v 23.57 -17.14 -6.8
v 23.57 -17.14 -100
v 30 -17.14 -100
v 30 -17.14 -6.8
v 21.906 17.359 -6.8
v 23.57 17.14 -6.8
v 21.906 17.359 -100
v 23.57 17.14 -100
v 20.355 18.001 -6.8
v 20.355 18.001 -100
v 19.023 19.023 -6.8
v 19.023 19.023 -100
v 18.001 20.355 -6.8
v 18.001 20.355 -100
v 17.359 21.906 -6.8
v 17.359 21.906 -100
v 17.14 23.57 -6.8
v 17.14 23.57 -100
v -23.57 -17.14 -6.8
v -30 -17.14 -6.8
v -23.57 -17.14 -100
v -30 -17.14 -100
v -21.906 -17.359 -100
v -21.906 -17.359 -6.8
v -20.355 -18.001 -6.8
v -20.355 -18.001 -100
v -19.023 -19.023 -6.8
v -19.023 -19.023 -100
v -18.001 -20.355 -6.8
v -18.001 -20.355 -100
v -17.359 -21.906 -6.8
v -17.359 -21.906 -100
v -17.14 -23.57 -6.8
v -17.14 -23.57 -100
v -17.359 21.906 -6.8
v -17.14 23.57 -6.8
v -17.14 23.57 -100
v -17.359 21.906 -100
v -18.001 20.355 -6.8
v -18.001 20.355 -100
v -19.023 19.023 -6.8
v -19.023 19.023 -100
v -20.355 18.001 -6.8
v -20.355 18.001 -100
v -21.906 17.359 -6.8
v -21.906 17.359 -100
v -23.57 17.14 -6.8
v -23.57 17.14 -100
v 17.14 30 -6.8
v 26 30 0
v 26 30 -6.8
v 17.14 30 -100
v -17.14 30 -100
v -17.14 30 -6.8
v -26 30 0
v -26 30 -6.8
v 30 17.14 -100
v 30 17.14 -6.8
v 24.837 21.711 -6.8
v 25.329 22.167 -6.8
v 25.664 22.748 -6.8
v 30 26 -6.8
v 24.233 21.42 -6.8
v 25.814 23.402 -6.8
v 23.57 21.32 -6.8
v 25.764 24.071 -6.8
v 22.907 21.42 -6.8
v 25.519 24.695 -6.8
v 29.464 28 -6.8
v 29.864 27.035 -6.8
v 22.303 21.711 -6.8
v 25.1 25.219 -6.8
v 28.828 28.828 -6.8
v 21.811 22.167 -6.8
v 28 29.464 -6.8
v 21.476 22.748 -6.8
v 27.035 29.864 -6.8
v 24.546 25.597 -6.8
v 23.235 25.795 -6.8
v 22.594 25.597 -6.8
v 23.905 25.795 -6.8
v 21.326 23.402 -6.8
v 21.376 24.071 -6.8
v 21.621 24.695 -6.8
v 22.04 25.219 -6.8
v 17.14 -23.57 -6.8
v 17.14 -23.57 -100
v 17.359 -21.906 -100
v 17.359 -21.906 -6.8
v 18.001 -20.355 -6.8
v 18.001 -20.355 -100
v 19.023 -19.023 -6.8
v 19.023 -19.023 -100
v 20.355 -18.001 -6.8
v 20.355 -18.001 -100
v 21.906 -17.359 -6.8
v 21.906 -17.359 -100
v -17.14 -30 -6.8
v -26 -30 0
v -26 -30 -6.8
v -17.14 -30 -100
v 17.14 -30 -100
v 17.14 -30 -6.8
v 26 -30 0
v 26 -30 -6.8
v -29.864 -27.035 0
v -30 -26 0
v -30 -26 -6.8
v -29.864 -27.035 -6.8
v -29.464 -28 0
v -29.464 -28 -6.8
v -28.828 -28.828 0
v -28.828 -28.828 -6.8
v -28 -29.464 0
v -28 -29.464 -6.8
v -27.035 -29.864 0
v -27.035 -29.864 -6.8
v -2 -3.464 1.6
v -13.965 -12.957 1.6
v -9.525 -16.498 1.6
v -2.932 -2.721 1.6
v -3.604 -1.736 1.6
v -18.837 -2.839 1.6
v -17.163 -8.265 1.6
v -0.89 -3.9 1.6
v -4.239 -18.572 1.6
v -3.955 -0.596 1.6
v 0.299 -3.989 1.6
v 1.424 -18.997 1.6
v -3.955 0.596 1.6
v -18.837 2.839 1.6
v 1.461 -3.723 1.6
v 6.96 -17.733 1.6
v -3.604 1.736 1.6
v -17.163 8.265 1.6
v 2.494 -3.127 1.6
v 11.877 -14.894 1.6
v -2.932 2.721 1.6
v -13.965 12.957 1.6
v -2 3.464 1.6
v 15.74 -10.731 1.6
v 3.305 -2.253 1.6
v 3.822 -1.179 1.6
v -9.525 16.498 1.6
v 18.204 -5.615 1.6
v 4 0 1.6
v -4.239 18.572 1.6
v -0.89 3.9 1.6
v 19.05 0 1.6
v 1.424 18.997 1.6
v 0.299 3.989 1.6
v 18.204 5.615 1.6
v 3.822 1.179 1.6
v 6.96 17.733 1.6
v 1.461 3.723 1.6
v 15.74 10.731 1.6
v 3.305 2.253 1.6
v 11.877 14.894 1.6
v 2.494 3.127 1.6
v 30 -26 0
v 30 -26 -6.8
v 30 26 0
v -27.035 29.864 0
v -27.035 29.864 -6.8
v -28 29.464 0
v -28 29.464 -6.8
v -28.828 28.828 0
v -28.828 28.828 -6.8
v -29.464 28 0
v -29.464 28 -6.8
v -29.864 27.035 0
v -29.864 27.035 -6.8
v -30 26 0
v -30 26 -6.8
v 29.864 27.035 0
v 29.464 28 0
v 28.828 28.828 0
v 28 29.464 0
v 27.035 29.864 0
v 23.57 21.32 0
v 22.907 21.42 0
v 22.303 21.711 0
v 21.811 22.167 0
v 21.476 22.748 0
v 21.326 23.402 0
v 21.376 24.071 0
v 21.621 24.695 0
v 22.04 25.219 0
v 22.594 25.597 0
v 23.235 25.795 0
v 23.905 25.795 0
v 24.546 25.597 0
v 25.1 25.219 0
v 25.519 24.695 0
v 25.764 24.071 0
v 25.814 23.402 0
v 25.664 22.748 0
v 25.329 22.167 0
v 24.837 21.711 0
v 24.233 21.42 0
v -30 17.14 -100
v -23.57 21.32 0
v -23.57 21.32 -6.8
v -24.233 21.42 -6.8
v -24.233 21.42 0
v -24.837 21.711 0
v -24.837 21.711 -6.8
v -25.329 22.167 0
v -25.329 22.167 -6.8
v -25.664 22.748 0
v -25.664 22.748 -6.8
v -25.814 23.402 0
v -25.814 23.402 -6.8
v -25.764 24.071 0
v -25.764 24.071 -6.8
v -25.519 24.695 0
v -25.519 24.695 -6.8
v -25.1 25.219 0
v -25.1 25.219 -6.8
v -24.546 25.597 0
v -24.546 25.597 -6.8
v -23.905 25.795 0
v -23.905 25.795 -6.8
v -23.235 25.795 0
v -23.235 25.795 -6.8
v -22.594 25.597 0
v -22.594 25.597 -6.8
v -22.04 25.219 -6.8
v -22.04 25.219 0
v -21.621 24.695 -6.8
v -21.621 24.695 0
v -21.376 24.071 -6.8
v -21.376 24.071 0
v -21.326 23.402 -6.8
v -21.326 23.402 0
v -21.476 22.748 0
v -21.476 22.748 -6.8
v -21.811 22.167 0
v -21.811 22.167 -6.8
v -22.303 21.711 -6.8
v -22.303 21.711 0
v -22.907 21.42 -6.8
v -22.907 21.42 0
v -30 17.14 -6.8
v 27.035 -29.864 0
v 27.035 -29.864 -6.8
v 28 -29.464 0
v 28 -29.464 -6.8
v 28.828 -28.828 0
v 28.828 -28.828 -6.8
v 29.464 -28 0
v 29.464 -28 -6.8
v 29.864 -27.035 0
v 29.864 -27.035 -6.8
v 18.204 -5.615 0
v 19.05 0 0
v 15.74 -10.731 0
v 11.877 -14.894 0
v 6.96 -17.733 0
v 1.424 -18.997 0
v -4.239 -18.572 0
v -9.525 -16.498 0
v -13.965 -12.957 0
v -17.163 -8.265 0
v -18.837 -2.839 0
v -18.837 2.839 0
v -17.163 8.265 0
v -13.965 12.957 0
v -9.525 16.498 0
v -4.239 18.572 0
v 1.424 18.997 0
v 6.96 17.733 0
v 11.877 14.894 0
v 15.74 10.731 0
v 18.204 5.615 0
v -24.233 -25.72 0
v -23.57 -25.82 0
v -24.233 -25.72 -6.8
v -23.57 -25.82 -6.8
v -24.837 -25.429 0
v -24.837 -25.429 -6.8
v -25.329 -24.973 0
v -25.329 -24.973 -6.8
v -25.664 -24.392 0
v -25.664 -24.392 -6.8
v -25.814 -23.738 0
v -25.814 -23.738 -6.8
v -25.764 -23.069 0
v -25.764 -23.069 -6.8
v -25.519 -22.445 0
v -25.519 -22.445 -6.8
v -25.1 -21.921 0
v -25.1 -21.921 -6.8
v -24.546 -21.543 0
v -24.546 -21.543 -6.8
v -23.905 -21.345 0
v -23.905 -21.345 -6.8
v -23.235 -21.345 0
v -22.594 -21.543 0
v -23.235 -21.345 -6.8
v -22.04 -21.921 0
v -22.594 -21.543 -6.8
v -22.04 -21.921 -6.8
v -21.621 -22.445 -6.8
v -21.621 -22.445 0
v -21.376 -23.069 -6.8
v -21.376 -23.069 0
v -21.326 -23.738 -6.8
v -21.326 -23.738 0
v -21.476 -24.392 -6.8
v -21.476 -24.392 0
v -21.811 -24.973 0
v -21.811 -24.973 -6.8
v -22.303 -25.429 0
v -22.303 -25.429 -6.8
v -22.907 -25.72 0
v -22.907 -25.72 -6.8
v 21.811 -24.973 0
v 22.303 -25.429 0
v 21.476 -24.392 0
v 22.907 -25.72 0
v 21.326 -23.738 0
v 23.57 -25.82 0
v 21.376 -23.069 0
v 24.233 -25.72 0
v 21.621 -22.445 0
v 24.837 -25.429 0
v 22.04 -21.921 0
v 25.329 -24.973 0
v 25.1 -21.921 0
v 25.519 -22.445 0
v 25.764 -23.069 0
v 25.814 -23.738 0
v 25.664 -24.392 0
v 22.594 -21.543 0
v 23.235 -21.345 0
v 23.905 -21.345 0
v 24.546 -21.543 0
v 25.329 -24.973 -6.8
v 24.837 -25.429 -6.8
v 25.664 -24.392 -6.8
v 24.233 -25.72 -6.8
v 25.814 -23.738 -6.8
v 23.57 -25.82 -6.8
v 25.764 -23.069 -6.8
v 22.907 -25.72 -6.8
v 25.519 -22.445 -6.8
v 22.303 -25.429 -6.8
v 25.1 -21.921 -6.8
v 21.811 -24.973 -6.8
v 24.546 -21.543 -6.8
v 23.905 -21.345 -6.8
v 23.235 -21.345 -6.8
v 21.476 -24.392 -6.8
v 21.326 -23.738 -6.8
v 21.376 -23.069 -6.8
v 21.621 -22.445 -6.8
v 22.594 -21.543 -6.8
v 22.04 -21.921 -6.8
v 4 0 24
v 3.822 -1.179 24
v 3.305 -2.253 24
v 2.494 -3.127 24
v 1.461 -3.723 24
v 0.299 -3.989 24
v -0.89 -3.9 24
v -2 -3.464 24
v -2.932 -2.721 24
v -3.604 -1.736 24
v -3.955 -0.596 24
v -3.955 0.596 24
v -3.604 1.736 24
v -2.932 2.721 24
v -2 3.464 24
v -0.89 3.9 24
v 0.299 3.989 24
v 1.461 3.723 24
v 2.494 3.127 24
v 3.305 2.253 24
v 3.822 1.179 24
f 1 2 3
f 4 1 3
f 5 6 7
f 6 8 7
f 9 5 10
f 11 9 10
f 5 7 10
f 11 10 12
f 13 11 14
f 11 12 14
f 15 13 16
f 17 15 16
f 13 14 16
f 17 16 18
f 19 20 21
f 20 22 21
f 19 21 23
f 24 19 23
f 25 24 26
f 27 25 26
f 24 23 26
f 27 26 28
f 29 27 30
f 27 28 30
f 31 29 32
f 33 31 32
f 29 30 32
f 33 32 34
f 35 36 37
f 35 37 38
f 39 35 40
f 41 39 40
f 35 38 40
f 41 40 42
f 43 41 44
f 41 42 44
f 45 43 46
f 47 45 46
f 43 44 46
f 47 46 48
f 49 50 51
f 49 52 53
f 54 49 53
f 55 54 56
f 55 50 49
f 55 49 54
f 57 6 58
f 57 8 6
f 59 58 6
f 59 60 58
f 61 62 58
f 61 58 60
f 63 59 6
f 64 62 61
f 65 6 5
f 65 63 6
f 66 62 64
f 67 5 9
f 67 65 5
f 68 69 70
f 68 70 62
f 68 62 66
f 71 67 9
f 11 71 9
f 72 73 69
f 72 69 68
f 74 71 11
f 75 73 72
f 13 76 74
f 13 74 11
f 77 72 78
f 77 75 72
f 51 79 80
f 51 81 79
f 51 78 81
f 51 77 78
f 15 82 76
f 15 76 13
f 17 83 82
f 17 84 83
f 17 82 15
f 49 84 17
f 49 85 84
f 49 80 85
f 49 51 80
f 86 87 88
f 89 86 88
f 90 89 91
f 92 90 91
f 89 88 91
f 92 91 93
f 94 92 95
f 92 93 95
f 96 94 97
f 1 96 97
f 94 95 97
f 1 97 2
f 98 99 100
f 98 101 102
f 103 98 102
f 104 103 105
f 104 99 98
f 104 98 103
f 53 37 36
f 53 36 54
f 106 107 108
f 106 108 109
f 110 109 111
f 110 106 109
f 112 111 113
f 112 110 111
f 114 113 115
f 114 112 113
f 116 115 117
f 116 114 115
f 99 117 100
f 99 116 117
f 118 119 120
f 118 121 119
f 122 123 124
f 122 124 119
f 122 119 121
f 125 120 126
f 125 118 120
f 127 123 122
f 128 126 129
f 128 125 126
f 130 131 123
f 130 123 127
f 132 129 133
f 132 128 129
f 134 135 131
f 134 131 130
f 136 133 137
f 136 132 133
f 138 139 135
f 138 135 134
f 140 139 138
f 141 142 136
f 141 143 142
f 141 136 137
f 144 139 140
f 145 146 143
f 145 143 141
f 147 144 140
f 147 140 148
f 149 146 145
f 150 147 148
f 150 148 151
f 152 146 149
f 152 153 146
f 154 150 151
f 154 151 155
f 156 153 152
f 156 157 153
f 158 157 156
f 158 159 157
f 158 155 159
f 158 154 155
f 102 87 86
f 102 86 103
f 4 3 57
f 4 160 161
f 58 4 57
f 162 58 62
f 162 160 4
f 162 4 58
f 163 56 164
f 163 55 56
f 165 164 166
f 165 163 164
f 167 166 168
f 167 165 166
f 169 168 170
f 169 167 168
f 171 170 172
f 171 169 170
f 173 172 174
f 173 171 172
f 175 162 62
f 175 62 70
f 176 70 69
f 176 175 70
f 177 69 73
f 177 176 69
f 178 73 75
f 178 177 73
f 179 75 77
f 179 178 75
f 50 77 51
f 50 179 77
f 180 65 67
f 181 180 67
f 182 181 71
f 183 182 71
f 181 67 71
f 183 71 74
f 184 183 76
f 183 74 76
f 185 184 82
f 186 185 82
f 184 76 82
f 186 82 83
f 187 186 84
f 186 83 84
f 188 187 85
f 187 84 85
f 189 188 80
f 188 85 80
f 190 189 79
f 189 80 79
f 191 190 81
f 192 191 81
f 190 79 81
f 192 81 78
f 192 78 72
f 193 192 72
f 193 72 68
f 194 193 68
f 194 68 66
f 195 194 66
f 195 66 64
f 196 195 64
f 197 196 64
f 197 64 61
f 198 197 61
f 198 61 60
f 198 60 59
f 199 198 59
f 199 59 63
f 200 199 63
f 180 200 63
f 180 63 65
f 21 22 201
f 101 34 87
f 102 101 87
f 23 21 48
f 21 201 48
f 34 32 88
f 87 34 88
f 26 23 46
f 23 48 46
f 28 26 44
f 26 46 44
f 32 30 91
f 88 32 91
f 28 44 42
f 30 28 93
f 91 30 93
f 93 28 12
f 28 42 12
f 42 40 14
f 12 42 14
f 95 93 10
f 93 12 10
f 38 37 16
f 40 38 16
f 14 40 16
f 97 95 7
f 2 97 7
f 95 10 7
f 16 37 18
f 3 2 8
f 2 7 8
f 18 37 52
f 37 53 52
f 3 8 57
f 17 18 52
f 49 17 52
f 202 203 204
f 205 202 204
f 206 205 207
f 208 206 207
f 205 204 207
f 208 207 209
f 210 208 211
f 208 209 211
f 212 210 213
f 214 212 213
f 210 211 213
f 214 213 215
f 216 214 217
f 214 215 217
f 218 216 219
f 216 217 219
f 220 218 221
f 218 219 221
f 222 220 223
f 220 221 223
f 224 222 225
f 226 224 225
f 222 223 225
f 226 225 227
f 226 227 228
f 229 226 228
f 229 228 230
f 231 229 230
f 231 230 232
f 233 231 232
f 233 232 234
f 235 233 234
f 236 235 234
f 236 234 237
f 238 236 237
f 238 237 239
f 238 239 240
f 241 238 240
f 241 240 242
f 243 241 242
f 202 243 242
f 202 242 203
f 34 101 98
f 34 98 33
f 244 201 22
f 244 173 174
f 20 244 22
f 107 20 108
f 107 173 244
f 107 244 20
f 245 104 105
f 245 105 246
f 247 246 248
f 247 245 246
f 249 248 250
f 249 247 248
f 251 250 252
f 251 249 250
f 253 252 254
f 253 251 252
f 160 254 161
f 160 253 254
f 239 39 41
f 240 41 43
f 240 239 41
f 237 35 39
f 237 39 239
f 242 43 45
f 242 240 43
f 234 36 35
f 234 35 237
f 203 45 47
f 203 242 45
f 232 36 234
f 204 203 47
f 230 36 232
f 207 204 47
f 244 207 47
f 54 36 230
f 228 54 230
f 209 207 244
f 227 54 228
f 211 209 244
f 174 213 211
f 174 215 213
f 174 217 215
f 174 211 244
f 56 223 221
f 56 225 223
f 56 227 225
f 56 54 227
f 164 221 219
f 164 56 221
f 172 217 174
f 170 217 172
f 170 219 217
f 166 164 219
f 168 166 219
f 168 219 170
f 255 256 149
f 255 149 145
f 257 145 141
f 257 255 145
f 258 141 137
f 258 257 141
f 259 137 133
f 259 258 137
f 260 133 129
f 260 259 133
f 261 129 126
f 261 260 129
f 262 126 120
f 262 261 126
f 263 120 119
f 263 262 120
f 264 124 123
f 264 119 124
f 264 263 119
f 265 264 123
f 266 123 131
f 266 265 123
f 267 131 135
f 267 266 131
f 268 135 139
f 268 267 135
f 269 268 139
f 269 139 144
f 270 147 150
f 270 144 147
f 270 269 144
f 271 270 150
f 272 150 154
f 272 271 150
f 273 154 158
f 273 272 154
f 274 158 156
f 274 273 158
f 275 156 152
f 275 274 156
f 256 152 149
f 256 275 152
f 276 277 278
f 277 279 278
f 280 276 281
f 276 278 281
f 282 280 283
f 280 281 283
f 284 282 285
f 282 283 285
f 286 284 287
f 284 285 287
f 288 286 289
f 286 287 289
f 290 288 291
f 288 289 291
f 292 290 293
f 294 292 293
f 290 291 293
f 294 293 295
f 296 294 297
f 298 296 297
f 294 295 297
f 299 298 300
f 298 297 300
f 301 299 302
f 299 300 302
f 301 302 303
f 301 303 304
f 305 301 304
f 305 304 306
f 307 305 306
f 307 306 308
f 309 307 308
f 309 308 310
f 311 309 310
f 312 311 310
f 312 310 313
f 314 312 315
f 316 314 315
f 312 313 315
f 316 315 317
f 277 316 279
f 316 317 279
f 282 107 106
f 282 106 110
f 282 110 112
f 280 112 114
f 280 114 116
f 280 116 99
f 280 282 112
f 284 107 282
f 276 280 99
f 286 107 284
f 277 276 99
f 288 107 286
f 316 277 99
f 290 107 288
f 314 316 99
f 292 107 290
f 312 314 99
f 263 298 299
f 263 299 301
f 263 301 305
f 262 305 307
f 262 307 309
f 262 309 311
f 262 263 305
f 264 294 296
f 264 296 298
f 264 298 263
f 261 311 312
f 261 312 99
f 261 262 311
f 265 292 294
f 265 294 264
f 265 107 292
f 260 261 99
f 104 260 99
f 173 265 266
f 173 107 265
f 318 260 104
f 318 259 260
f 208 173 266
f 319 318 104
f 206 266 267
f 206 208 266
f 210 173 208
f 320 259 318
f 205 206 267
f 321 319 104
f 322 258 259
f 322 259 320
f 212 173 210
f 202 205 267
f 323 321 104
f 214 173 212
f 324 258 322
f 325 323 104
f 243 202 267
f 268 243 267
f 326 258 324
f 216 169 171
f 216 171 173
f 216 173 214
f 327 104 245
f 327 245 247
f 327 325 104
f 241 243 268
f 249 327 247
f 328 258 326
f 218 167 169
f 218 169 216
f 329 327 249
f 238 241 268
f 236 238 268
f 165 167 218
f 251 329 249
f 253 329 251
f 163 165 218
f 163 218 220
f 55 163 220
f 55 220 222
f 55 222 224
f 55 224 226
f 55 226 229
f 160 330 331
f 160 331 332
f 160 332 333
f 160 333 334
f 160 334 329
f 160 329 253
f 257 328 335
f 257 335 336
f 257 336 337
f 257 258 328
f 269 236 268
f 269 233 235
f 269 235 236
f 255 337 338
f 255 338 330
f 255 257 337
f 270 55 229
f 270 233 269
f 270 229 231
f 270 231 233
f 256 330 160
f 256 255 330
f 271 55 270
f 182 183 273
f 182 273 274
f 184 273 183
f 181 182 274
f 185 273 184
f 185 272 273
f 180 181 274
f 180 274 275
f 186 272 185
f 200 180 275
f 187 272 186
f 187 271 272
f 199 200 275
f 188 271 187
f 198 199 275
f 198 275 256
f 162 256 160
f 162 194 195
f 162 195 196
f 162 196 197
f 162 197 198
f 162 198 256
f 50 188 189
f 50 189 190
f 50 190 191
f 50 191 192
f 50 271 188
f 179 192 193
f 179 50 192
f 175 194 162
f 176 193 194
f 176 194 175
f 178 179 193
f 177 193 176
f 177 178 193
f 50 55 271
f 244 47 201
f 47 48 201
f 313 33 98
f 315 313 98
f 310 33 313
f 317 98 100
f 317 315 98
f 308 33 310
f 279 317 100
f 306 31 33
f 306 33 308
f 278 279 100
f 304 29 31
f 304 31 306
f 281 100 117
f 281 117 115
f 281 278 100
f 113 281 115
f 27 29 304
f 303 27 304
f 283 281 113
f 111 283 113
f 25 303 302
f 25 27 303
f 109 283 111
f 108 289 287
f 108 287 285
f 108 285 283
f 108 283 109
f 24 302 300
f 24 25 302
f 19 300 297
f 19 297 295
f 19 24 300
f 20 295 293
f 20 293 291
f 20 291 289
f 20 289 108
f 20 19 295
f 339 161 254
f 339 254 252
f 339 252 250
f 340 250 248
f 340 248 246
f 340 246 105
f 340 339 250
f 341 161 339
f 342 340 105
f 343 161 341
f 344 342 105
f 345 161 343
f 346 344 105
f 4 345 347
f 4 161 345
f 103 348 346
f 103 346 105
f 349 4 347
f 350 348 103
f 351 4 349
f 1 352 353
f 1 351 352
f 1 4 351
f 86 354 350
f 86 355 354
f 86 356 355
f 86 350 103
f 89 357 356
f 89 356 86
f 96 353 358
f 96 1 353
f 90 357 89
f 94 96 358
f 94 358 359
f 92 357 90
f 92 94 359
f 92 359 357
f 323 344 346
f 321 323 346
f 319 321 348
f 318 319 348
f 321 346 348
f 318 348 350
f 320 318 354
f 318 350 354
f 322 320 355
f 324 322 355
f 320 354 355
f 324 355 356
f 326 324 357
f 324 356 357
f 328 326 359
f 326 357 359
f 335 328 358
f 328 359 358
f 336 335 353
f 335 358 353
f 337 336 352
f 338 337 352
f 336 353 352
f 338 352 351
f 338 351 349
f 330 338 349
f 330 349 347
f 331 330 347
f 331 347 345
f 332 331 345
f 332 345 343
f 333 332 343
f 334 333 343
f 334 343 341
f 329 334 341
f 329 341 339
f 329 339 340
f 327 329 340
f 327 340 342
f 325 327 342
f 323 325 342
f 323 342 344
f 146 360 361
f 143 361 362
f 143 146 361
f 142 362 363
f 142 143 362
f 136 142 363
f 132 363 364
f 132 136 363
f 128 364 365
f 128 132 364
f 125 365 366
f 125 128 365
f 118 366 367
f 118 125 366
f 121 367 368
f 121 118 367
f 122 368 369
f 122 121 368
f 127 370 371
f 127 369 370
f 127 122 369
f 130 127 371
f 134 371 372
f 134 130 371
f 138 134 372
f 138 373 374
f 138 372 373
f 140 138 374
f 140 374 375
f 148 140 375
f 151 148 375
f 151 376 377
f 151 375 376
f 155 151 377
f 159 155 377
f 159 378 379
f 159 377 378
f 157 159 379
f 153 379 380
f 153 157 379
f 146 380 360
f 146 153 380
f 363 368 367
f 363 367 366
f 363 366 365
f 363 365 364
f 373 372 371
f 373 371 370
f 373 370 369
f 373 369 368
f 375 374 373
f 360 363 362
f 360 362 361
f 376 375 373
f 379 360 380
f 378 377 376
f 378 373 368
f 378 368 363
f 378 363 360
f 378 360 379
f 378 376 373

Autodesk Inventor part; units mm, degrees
ref_plane "YZ Plane" through (0, 0, 0) normal (1, 0, 0) x (0, 1, 0)
ref_plane "XZ Plane" through (0, 0, 0) normal (0, 1, 0) x (-1, 0, 0)
ref_plane "XY Plane" through (0, 0, 0) normal (0, 0, 1) x (1, 0, 0)
sketch "Skizze1" plane through (0, 0, 0) normal (0, 0, 1) x (1, 0, 0)
  line L0 (-26, -30) -> (26, -30)
  line L1 (30, -26) -> (30, 26)
  line L2 (26, 30) -> (-26, 30)
  line L3 (-30, 26) -> (-30, -26)
  line L4 (-30, -30) -> (30, 30) construction
  line L5 (30, -30) -> (-30, 30) construction
  arc A0 (30, 26) -> (26, 30) centre (26, 26) ccw
  arc A1 (26, -30) -> (30, -26) centre (26, -26) ccw
  arc A2 (-30, -26) -> (-26, -30) centre (-26, -26) ccw
  arc A3 (-26, 30) -> (-30, 26) centre (-26, 26) ccw
  point P0 (0, 0)
  dimension "d0" = 4
  dimension "d1" = 60
extrude "Extrusion1" add sketch "Skizze1" against normal blind 100
sketch "Skizze2" plane through (0, 0, 0) normal (0, 0, 1) x (1, 0, 0)
  circle A0 centre (0, 0) radius 19.05
  dimension "d4" = 38.1
extrude "Extrusion2" add sketch "Skizze2" along normal blind 1.6
sketch "Skizze4" plane through (0, 0, 0) normal (0, 0, 1) x (1, 0, 0)
  circle A0 centre (0, 0) radius 19.05 projected
  line L0 (30, 26) -> (30, -26) projected
  arc A1 (30, 26) -> (26, 30) centre (26, 26) ccw projected
  line L1 (-26, 30) -> (26, 30) projected
  arc A2 (-26, 30) -> (-30, 26) centre (-26, 26) ccw projected
  line L2 (-30, -26) -> (-30, 26) projected
  arc A3 (-30, -26) -> (-26, -30) centre (-26, -26) ccw projected
  line L3 (26, -30) -> (-26, -30) projected
  arc A4 (26, -30) -> (30, -26) centre (26, -26) ccw projected
  line L4 (26, -26) -> (-26, 26) construction
  line L5 (-23.57, 23.57) -> (23.57, 23.57) construction
  line L6 (23.57, 23.57) -> (23.57, -23.57) construction
  line L7 (23.57, -23.57) -> (-23.57, -23.57) construction
  line L8 (-23.57, -23.57) -> (-23.57, 23.57) construction
  line L9 (-23.57, 23.57) -> (23.57, -23.57) construction
  line L10 (23.57, 23.57) -> (-23.57, -23.57) construction
  dimension "d15" = 47.14
hole "Bohrung1" at (23.57, 23.57, 0) at (-23.57, 23.57, 0) at (-23.57, -23.57, 0) at (23.57, -23.57, 0) direction (0, 0, -1) diameter 4.5 end through all
sketch "Skizze5" plane through (0, 0, 1.6) normal (0, 0, 1) x (1, 0, 0)
  circle A0 centre (0, 0) radius 4
  dimension "d23" = 8
extrude "Extrusion4" add sketch "Skizze5" along normal blind 22.4
sketch "Skizze7" plane through (0, 0, -100) normal (0, 0, -1) x (-1, 0, 0)
  circle A0 centre (23.57, -23.57) radius 2.25 projected
  circle A1 centre (-23.57, 23.57) radius 2.25 projected
  circle A2 centre (23.57, 23.57) radius 2.25 projected
  circle A3 centre (-23.57, -23.57) radius 2.25 projected
  line L0 (-30, 26) -> (-30, -26) projected
  arc A4 (-30, -26) -> (-26, -30) centre (-26, -26) ccw projected
  line L1 (-26, -30) -> (26, -30) projected
  arc A5 (26, -30) -> (30, -26) centre (26, -26) ccw projected
  line L2 (30, -26) -> (30, 26) projected
  arc A6 (30, 26) -> (26, 30) centre (26, 26) ccw projected
  line L3 (26, 30) -> (-26, 30) projected
  arc A7 (-26, 30) -> (-30, 26) centre (-26, 26) ccw projected
  circle A8 centre (23.57, -23.57) radius 6.43 construction
  line L4 (30, -26) -> (30, 26) projected
  line L5 (30, -17.14) -> (23.57, -17.14)
  line L6 (-26, -30) -> (26, -30) projected
  line L7 (17.14, -30) -> (17.14, -23.57)
  arc A9 (23.57, -17.14) -> (17.14, -23.57) centre (23.57, -23.57) ccw
  arc A10 (-17.14, -23.57) -> (-23.57, -17.14) centre (-23.57, -23.57) ccw
  arc A11 (17.2019, 24.4599) -> (23.57, 17.14) centre (23.57, 23.57) ccw
  arc A12 (-23.57, 17.14) -> (-17.14, 23.57) centre (-23.57, 23.57) ccw
  line L8 (23.57, 17.14) -> (30, 17.14)
  line L9 (17.14, 23.57) -> (17.14, 30)
  line L10 (26, 30) -> (-26, 30) projected
  line L11 (-17.14, 23.57) -> (-17.14, 30)
  line L12 (-23.57, 17.14) -> (-30, 17.14)
  line L13 (-23.57, -17.14) -> (-30, -17.14)
  line L14 (-17.14, -23.57) -> (-17.14, -30)
  point P0 (0, 0)
extrude "Extrusion6" cut sketch "Skizze7" against normal blind 93.2 contours A7 L3 L11 A12 L12 L0 | L13 A10 L14 L1 A4 L0 | L3 A6 L2 L8 A11 L9 | L7 A9 L5 L2 A5 L1
sketch "Skizze8" plane through (0, 0, -100) normal (0, 0, -1) x (-1, 0, 0)
  circle A0 centre (23.57, -23.57) radius 2.25 construction
  circle A1 centre (-23.57, 23.57) radius 2.25 construction
  circle A2 centre (23.57, 23.57) radius 2.25 construction
  circle A3 centre (-23.57, -23.57) radius 2.25 construction
  circle A4 centre (0, 0) radius 19.05 construction
  line L0 (-30, 26) -> (-30, -26) construction
  arc A5 (-26, 30) -> (-30, 26) centre (-26, 26) ccw construction
  line L1 (26, 30) -> (-26, 30) construction
  arc A6 (30, 26) -> (26, 30) centre (26, 26) ccw construction
  line L2 (30, -26) -> (30, 26) construction
  arc A7 (26, -30) -> (30, -26) centre (26, -26) ccw construction
  line L3 (-26, -30) -> (26, -30) construction
  arc A8 (-30, -26) -> (-26, -30) centre (-26, -26) ccw construction
  circle A9 centre (0, 0) radius 42.4264 construction
  line L4 (30, 30) -> (-30, 30) construction
  line L5 (-30, 30) -> (-30, -30) construction
  line L6 (-30, -30) -> (30, -30) construction
  line L7 (30, -30) -> (30, 30) construction
  line L8 (30, 30) -> (-30, -30) construction
  line L9 (-30, 30) -> (30, -30) construction
  line L10 (-17.14, -30) -> (17.14, -30) construction
  line L11 (-30, 17.14) -> (-30, -17.14) construction
equation "\"d1\" = breite"
equation "\"d2\" = Laenge"
equation "\"d4\" = fit"
equation "\"d5\" = fit_l"
equation "\"d15\" = lochabstand"
equation "\"d16\" = bohrung_d"
equation "\"d23\" = schaft_d"
equation "\"d24\" = schaft_l"
equation "\"d28\" = Laenge - Mount_l"
equation "\"breite\" = 60"
equation "\"lochabstand\" = 47.14"
equation "\"schaft_d\" = 8"
equation "\"fit\" = 38.1"
equation "\"fit_l\" = 1.6"
equation "\"Mount_l\" = 6.8"
equation "\"Laenge\" = 100"
equation "\"bohrung_d\" = 4.5"
equation "\"schaft_l\" = 22.4"
properties part number "Nema24 - L100" material "Stahl"
